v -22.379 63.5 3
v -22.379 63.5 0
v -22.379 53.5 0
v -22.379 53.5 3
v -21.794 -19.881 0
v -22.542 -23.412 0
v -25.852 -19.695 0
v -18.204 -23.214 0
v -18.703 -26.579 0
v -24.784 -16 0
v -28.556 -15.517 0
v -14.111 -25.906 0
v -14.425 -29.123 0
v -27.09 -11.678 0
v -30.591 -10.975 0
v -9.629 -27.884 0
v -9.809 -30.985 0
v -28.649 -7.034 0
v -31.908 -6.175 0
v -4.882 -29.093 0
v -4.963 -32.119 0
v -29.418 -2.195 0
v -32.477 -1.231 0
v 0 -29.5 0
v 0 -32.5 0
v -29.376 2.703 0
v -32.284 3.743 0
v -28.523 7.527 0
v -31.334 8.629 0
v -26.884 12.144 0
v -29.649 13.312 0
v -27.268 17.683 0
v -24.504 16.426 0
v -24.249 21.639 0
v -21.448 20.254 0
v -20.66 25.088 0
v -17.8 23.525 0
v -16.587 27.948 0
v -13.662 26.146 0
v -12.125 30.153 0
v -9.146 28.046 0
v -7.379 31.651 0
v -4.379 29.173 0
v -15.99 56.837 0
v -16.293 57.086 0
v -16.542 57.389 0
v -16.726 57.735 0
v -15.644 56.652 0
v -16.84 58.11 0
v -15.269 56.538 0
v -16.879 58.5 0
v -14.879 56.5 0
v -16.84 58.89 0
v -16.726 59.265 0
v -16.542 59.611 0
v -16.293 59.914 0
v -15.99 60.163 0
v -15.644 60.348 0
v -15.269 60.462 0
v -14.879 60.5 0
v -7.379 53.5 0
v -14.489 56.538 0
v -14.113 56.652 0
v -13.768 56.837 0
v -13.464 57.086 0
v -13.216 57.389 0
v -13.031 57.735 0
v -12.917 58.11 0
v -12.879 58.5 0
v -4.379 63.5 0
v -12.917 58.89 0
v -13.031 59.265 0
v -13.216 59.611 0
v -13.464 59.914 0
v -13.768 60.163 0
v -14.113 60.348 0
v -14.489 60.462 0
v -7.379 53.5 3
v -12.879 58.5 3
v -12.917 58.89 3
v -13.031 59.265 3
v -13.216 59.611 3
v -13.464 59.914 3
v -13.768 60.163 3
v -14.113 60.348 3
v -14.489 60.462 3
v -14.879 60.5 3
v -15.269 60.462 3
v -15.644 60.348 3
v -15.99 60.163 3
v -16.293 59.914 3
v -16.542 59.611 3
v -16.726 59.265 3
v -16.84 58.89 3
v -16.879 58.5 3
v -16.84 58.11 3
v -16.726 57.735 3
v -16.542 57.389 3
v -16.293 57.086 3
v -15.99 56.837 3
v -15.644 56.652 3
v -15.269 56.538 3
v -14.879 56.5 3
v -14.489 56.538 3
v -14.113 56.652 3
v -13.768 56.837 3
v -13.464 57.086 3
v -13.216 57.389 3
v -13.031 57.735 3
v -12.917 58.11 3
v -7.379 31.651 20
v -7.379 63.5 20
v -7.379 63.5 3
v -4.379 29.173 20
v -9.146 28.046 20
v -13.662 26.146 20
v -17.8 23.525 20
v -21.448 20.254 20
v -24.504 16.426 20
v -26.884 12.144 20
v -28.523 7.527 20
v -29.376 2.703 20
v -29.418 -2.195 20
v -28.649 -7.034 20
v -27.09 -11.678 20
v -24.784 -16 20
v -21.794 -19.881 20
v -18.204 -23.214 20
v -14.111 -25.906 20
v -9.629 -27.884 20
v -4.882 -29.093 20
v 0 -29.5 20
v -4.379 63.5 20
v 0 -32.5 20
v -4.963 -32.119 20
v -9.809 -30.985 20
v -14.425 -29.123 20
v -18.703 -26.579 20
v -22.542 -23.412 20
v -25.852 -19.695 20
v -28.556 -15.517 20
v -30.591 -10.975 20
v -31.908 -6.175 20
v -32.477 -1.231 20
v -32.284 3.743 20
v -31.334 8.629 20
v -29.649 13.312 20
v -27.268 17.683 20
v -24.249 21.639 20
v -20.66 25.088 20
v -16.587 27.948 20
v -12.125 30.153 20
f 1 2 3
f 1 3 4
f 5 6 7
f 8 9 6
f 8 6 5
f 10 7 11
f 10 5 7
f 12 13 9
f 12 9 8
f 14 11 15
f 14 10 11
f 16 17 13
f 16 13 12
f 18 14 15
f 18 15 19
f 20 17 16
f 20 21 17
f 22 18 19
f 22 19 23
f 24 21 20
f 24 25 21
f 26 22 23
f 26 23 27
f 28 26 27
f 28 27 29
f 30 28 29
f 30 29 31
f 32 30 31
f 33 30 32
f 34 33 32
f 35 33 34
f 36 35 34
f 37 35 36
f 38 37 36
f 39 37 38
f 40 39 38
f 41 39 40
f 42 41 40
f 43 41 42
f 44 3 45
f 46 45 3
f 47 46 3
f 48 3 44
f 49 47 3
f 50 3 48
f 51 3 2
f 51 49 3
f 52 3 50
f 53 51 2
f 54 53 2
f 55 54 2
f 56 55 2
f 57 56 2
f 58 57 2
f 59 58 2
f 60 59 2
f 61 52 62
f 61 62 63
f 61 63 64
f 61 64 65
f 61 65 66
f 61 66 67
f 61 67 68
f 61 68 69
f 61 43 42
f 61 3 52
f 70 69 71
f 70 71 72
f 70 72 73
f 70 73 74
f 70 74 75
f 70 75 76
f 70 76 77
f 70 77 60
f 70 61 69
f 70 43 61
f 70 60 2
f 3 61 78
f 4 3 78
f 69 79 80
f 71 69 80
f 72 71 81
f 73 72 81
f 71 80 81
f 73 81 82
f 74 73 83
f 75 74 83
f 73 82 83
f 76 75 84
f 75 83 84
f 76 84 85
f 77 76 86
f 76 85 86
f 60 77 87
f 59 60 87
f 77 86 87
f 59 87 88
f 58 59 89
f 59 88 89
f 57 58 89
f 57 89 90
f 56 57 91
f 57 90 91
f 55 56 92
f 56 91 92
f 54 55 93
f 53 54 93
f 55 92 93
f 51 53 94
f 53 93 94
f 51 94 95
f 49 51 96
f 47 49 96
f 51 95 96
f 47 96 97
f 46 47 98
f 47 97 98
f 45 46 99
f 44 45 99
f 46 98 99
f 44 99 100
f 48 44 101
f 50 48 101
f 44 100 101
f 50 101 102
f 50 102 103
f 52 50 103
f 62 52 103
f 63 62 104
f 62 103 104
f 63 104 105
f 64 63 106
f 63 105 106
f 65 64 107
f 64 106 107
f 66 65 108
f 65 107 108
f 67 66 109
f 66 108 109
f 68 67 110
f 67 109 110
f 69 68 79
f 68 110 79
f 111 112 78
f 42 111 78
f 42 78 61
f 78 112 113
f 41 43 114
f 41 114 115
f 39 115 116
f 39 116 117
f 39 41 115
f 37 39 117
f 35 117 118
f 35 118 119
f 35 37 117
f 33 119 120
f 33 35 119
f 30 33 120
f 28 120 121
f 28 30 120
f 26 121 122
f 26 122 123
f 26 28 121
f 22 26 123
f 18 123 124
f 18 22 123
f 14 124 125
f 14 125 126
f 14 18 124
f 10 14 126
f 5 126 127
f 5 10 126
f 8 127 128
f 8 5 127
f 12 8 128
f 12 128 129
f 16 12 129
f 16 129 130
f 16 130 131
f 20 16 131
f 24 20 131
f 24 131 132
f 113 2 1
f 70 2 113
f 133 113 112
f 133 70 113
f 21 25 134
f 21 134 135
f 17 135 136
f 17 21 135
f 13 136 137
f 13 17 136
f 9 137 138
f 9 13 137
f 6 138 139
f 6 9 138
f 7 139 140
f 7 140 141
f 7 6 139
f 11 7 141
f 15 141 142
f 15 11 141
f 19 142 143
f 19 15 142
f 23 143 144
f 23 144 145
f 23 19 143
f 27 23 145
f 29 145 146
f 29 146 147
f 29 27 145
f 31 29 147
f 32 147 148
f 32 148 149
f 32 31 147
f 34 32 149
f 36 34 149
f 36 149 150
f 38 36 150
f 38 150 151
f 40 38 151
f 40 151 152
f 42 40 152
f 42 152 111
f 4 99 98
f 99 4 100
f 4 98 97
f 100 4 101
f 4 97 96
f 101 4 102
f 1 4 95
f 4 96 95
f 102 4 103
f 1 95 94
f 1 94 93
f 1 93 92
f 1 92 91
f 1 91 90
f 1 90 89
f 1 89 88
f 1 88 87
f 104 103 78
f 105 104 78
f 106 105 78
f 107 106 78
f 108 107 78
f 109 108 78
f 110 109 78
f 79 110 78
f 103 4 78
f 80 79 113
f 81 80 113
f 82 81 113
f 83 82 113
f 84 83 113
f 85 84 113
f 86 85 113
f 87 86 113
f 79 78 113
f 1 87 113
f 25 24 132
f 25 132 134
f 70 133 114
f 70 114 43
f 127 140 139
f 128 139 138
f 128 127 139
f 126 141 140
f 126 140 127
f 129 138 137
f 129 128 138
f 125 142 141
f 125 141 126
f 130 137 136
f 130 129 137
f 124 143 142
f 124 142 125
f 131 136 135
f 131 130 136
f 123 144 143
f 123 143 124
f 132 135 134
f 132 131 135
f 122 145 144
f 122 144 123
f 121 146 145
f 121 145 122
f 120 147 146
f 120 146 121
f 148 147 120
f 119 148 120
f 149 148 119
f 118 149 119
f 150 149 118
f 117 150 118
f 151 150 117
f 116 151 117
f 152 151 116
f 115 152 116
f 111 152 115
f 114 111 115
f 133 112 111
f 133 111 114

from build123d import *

# Parameters (mm, degrees)
BOSS_EXTRUDE1_DEPTH             = 20
SKETCH3_W                       = 3
SKETCH3_H                       = 20
BOSS_EXTRUDE3_DEPTH             = 31
BOSS_EXTRUDE3_DIRECTION_2_REACH = 77.374
SKETCH4_W                       = 3
SKETCH4_H                       = 10
BOSS_EXTRUDE4_DEPTH             = 15
SKETCH6_R                       = 2
CUT_EXTRUDE2_DEPTH              = 3


with BuildPart() as part:
    # Sketch1 → Boss-Extrude1 (new body)
    with BuildSketch(Plane.XY):
        with BuildLine():
            Line((0, -29.5), (0, -32.5))
            ThreePointArc((0, -32.5), (-32.4258356, -2.194353132), (-4.378691316, 32.203680882))
            Line((-4.378691316, 32.203680882), (-4.378691316, 29.173225093))
            ThreePointArc((-4.378691316, 29.173225093), (-29.418192843, -2.195433869), (0, -29.5))
        make_face()
    extrude(amount=BOSS_EXTRUDE1_DEPTH)

    # Sketch3 → Boss-Extrude3 (add)
    with BuildSketch(Plane(origin=(0, 32.5, 0), x_dir=(1, 0, 0), z_dir=(0, 1, 0))):
        with Locations((-5.878691316, -10)):
            Rectangle(SKETCH3_W, SKETCH3_H)
    extrude(amount=BOSS_EXTRUDE3_DEPTH)

    # Sketch3 → Boss-Extrude3 direction 2 (add, up to next)
    with BuildSketch(Plane(origin=(0, 32.5, 0), x_dir=(1, 0, 0), z_dir=(0, 1, 0)), mode=Mode.PRIVATE) as boss_extrude3_direction_2_sk1:
        with Locations((-5.878691316, -10)):
            Rectangle(SKETCH3_W, SKETCH3_H)
    boss_extrude3_direction_2_tool1 = extrude(boss_extrude3_direction_2_sk1.sketch, amount=-BOSS_EXTRUDE3_DIRECTION_2_REACH, mode=Mode.PRIVATE) - part.part
    add(boss_extrude3_direction_2_tool1.solids().sort_by_distance((-5.878691, 32.5, 10))[0])

    # Sketch4 → Boss-Extrude4 (add)
    with BuildSketch(Plane.ZY.offset(7.378691316)):
        with Locations((1.5, 58.5)):
            Rectangle(SKETCH4_W, SKETCH4_H)
    extrude(amount=BOSS_EXTRUDE4_DEPTH)

    # Sketch6 → Cut-Extrude2 (cut)
    with BuildSketch(Plane.XY.offset(3)):
        with Locations((-14.878691316, 58.5)):
            Circle(SKETCH6_R)
    extrude(amount=-CUT_EXTRUDE2_DEPTH, mode=Mode.SUBTRACT)


solid = part.part
